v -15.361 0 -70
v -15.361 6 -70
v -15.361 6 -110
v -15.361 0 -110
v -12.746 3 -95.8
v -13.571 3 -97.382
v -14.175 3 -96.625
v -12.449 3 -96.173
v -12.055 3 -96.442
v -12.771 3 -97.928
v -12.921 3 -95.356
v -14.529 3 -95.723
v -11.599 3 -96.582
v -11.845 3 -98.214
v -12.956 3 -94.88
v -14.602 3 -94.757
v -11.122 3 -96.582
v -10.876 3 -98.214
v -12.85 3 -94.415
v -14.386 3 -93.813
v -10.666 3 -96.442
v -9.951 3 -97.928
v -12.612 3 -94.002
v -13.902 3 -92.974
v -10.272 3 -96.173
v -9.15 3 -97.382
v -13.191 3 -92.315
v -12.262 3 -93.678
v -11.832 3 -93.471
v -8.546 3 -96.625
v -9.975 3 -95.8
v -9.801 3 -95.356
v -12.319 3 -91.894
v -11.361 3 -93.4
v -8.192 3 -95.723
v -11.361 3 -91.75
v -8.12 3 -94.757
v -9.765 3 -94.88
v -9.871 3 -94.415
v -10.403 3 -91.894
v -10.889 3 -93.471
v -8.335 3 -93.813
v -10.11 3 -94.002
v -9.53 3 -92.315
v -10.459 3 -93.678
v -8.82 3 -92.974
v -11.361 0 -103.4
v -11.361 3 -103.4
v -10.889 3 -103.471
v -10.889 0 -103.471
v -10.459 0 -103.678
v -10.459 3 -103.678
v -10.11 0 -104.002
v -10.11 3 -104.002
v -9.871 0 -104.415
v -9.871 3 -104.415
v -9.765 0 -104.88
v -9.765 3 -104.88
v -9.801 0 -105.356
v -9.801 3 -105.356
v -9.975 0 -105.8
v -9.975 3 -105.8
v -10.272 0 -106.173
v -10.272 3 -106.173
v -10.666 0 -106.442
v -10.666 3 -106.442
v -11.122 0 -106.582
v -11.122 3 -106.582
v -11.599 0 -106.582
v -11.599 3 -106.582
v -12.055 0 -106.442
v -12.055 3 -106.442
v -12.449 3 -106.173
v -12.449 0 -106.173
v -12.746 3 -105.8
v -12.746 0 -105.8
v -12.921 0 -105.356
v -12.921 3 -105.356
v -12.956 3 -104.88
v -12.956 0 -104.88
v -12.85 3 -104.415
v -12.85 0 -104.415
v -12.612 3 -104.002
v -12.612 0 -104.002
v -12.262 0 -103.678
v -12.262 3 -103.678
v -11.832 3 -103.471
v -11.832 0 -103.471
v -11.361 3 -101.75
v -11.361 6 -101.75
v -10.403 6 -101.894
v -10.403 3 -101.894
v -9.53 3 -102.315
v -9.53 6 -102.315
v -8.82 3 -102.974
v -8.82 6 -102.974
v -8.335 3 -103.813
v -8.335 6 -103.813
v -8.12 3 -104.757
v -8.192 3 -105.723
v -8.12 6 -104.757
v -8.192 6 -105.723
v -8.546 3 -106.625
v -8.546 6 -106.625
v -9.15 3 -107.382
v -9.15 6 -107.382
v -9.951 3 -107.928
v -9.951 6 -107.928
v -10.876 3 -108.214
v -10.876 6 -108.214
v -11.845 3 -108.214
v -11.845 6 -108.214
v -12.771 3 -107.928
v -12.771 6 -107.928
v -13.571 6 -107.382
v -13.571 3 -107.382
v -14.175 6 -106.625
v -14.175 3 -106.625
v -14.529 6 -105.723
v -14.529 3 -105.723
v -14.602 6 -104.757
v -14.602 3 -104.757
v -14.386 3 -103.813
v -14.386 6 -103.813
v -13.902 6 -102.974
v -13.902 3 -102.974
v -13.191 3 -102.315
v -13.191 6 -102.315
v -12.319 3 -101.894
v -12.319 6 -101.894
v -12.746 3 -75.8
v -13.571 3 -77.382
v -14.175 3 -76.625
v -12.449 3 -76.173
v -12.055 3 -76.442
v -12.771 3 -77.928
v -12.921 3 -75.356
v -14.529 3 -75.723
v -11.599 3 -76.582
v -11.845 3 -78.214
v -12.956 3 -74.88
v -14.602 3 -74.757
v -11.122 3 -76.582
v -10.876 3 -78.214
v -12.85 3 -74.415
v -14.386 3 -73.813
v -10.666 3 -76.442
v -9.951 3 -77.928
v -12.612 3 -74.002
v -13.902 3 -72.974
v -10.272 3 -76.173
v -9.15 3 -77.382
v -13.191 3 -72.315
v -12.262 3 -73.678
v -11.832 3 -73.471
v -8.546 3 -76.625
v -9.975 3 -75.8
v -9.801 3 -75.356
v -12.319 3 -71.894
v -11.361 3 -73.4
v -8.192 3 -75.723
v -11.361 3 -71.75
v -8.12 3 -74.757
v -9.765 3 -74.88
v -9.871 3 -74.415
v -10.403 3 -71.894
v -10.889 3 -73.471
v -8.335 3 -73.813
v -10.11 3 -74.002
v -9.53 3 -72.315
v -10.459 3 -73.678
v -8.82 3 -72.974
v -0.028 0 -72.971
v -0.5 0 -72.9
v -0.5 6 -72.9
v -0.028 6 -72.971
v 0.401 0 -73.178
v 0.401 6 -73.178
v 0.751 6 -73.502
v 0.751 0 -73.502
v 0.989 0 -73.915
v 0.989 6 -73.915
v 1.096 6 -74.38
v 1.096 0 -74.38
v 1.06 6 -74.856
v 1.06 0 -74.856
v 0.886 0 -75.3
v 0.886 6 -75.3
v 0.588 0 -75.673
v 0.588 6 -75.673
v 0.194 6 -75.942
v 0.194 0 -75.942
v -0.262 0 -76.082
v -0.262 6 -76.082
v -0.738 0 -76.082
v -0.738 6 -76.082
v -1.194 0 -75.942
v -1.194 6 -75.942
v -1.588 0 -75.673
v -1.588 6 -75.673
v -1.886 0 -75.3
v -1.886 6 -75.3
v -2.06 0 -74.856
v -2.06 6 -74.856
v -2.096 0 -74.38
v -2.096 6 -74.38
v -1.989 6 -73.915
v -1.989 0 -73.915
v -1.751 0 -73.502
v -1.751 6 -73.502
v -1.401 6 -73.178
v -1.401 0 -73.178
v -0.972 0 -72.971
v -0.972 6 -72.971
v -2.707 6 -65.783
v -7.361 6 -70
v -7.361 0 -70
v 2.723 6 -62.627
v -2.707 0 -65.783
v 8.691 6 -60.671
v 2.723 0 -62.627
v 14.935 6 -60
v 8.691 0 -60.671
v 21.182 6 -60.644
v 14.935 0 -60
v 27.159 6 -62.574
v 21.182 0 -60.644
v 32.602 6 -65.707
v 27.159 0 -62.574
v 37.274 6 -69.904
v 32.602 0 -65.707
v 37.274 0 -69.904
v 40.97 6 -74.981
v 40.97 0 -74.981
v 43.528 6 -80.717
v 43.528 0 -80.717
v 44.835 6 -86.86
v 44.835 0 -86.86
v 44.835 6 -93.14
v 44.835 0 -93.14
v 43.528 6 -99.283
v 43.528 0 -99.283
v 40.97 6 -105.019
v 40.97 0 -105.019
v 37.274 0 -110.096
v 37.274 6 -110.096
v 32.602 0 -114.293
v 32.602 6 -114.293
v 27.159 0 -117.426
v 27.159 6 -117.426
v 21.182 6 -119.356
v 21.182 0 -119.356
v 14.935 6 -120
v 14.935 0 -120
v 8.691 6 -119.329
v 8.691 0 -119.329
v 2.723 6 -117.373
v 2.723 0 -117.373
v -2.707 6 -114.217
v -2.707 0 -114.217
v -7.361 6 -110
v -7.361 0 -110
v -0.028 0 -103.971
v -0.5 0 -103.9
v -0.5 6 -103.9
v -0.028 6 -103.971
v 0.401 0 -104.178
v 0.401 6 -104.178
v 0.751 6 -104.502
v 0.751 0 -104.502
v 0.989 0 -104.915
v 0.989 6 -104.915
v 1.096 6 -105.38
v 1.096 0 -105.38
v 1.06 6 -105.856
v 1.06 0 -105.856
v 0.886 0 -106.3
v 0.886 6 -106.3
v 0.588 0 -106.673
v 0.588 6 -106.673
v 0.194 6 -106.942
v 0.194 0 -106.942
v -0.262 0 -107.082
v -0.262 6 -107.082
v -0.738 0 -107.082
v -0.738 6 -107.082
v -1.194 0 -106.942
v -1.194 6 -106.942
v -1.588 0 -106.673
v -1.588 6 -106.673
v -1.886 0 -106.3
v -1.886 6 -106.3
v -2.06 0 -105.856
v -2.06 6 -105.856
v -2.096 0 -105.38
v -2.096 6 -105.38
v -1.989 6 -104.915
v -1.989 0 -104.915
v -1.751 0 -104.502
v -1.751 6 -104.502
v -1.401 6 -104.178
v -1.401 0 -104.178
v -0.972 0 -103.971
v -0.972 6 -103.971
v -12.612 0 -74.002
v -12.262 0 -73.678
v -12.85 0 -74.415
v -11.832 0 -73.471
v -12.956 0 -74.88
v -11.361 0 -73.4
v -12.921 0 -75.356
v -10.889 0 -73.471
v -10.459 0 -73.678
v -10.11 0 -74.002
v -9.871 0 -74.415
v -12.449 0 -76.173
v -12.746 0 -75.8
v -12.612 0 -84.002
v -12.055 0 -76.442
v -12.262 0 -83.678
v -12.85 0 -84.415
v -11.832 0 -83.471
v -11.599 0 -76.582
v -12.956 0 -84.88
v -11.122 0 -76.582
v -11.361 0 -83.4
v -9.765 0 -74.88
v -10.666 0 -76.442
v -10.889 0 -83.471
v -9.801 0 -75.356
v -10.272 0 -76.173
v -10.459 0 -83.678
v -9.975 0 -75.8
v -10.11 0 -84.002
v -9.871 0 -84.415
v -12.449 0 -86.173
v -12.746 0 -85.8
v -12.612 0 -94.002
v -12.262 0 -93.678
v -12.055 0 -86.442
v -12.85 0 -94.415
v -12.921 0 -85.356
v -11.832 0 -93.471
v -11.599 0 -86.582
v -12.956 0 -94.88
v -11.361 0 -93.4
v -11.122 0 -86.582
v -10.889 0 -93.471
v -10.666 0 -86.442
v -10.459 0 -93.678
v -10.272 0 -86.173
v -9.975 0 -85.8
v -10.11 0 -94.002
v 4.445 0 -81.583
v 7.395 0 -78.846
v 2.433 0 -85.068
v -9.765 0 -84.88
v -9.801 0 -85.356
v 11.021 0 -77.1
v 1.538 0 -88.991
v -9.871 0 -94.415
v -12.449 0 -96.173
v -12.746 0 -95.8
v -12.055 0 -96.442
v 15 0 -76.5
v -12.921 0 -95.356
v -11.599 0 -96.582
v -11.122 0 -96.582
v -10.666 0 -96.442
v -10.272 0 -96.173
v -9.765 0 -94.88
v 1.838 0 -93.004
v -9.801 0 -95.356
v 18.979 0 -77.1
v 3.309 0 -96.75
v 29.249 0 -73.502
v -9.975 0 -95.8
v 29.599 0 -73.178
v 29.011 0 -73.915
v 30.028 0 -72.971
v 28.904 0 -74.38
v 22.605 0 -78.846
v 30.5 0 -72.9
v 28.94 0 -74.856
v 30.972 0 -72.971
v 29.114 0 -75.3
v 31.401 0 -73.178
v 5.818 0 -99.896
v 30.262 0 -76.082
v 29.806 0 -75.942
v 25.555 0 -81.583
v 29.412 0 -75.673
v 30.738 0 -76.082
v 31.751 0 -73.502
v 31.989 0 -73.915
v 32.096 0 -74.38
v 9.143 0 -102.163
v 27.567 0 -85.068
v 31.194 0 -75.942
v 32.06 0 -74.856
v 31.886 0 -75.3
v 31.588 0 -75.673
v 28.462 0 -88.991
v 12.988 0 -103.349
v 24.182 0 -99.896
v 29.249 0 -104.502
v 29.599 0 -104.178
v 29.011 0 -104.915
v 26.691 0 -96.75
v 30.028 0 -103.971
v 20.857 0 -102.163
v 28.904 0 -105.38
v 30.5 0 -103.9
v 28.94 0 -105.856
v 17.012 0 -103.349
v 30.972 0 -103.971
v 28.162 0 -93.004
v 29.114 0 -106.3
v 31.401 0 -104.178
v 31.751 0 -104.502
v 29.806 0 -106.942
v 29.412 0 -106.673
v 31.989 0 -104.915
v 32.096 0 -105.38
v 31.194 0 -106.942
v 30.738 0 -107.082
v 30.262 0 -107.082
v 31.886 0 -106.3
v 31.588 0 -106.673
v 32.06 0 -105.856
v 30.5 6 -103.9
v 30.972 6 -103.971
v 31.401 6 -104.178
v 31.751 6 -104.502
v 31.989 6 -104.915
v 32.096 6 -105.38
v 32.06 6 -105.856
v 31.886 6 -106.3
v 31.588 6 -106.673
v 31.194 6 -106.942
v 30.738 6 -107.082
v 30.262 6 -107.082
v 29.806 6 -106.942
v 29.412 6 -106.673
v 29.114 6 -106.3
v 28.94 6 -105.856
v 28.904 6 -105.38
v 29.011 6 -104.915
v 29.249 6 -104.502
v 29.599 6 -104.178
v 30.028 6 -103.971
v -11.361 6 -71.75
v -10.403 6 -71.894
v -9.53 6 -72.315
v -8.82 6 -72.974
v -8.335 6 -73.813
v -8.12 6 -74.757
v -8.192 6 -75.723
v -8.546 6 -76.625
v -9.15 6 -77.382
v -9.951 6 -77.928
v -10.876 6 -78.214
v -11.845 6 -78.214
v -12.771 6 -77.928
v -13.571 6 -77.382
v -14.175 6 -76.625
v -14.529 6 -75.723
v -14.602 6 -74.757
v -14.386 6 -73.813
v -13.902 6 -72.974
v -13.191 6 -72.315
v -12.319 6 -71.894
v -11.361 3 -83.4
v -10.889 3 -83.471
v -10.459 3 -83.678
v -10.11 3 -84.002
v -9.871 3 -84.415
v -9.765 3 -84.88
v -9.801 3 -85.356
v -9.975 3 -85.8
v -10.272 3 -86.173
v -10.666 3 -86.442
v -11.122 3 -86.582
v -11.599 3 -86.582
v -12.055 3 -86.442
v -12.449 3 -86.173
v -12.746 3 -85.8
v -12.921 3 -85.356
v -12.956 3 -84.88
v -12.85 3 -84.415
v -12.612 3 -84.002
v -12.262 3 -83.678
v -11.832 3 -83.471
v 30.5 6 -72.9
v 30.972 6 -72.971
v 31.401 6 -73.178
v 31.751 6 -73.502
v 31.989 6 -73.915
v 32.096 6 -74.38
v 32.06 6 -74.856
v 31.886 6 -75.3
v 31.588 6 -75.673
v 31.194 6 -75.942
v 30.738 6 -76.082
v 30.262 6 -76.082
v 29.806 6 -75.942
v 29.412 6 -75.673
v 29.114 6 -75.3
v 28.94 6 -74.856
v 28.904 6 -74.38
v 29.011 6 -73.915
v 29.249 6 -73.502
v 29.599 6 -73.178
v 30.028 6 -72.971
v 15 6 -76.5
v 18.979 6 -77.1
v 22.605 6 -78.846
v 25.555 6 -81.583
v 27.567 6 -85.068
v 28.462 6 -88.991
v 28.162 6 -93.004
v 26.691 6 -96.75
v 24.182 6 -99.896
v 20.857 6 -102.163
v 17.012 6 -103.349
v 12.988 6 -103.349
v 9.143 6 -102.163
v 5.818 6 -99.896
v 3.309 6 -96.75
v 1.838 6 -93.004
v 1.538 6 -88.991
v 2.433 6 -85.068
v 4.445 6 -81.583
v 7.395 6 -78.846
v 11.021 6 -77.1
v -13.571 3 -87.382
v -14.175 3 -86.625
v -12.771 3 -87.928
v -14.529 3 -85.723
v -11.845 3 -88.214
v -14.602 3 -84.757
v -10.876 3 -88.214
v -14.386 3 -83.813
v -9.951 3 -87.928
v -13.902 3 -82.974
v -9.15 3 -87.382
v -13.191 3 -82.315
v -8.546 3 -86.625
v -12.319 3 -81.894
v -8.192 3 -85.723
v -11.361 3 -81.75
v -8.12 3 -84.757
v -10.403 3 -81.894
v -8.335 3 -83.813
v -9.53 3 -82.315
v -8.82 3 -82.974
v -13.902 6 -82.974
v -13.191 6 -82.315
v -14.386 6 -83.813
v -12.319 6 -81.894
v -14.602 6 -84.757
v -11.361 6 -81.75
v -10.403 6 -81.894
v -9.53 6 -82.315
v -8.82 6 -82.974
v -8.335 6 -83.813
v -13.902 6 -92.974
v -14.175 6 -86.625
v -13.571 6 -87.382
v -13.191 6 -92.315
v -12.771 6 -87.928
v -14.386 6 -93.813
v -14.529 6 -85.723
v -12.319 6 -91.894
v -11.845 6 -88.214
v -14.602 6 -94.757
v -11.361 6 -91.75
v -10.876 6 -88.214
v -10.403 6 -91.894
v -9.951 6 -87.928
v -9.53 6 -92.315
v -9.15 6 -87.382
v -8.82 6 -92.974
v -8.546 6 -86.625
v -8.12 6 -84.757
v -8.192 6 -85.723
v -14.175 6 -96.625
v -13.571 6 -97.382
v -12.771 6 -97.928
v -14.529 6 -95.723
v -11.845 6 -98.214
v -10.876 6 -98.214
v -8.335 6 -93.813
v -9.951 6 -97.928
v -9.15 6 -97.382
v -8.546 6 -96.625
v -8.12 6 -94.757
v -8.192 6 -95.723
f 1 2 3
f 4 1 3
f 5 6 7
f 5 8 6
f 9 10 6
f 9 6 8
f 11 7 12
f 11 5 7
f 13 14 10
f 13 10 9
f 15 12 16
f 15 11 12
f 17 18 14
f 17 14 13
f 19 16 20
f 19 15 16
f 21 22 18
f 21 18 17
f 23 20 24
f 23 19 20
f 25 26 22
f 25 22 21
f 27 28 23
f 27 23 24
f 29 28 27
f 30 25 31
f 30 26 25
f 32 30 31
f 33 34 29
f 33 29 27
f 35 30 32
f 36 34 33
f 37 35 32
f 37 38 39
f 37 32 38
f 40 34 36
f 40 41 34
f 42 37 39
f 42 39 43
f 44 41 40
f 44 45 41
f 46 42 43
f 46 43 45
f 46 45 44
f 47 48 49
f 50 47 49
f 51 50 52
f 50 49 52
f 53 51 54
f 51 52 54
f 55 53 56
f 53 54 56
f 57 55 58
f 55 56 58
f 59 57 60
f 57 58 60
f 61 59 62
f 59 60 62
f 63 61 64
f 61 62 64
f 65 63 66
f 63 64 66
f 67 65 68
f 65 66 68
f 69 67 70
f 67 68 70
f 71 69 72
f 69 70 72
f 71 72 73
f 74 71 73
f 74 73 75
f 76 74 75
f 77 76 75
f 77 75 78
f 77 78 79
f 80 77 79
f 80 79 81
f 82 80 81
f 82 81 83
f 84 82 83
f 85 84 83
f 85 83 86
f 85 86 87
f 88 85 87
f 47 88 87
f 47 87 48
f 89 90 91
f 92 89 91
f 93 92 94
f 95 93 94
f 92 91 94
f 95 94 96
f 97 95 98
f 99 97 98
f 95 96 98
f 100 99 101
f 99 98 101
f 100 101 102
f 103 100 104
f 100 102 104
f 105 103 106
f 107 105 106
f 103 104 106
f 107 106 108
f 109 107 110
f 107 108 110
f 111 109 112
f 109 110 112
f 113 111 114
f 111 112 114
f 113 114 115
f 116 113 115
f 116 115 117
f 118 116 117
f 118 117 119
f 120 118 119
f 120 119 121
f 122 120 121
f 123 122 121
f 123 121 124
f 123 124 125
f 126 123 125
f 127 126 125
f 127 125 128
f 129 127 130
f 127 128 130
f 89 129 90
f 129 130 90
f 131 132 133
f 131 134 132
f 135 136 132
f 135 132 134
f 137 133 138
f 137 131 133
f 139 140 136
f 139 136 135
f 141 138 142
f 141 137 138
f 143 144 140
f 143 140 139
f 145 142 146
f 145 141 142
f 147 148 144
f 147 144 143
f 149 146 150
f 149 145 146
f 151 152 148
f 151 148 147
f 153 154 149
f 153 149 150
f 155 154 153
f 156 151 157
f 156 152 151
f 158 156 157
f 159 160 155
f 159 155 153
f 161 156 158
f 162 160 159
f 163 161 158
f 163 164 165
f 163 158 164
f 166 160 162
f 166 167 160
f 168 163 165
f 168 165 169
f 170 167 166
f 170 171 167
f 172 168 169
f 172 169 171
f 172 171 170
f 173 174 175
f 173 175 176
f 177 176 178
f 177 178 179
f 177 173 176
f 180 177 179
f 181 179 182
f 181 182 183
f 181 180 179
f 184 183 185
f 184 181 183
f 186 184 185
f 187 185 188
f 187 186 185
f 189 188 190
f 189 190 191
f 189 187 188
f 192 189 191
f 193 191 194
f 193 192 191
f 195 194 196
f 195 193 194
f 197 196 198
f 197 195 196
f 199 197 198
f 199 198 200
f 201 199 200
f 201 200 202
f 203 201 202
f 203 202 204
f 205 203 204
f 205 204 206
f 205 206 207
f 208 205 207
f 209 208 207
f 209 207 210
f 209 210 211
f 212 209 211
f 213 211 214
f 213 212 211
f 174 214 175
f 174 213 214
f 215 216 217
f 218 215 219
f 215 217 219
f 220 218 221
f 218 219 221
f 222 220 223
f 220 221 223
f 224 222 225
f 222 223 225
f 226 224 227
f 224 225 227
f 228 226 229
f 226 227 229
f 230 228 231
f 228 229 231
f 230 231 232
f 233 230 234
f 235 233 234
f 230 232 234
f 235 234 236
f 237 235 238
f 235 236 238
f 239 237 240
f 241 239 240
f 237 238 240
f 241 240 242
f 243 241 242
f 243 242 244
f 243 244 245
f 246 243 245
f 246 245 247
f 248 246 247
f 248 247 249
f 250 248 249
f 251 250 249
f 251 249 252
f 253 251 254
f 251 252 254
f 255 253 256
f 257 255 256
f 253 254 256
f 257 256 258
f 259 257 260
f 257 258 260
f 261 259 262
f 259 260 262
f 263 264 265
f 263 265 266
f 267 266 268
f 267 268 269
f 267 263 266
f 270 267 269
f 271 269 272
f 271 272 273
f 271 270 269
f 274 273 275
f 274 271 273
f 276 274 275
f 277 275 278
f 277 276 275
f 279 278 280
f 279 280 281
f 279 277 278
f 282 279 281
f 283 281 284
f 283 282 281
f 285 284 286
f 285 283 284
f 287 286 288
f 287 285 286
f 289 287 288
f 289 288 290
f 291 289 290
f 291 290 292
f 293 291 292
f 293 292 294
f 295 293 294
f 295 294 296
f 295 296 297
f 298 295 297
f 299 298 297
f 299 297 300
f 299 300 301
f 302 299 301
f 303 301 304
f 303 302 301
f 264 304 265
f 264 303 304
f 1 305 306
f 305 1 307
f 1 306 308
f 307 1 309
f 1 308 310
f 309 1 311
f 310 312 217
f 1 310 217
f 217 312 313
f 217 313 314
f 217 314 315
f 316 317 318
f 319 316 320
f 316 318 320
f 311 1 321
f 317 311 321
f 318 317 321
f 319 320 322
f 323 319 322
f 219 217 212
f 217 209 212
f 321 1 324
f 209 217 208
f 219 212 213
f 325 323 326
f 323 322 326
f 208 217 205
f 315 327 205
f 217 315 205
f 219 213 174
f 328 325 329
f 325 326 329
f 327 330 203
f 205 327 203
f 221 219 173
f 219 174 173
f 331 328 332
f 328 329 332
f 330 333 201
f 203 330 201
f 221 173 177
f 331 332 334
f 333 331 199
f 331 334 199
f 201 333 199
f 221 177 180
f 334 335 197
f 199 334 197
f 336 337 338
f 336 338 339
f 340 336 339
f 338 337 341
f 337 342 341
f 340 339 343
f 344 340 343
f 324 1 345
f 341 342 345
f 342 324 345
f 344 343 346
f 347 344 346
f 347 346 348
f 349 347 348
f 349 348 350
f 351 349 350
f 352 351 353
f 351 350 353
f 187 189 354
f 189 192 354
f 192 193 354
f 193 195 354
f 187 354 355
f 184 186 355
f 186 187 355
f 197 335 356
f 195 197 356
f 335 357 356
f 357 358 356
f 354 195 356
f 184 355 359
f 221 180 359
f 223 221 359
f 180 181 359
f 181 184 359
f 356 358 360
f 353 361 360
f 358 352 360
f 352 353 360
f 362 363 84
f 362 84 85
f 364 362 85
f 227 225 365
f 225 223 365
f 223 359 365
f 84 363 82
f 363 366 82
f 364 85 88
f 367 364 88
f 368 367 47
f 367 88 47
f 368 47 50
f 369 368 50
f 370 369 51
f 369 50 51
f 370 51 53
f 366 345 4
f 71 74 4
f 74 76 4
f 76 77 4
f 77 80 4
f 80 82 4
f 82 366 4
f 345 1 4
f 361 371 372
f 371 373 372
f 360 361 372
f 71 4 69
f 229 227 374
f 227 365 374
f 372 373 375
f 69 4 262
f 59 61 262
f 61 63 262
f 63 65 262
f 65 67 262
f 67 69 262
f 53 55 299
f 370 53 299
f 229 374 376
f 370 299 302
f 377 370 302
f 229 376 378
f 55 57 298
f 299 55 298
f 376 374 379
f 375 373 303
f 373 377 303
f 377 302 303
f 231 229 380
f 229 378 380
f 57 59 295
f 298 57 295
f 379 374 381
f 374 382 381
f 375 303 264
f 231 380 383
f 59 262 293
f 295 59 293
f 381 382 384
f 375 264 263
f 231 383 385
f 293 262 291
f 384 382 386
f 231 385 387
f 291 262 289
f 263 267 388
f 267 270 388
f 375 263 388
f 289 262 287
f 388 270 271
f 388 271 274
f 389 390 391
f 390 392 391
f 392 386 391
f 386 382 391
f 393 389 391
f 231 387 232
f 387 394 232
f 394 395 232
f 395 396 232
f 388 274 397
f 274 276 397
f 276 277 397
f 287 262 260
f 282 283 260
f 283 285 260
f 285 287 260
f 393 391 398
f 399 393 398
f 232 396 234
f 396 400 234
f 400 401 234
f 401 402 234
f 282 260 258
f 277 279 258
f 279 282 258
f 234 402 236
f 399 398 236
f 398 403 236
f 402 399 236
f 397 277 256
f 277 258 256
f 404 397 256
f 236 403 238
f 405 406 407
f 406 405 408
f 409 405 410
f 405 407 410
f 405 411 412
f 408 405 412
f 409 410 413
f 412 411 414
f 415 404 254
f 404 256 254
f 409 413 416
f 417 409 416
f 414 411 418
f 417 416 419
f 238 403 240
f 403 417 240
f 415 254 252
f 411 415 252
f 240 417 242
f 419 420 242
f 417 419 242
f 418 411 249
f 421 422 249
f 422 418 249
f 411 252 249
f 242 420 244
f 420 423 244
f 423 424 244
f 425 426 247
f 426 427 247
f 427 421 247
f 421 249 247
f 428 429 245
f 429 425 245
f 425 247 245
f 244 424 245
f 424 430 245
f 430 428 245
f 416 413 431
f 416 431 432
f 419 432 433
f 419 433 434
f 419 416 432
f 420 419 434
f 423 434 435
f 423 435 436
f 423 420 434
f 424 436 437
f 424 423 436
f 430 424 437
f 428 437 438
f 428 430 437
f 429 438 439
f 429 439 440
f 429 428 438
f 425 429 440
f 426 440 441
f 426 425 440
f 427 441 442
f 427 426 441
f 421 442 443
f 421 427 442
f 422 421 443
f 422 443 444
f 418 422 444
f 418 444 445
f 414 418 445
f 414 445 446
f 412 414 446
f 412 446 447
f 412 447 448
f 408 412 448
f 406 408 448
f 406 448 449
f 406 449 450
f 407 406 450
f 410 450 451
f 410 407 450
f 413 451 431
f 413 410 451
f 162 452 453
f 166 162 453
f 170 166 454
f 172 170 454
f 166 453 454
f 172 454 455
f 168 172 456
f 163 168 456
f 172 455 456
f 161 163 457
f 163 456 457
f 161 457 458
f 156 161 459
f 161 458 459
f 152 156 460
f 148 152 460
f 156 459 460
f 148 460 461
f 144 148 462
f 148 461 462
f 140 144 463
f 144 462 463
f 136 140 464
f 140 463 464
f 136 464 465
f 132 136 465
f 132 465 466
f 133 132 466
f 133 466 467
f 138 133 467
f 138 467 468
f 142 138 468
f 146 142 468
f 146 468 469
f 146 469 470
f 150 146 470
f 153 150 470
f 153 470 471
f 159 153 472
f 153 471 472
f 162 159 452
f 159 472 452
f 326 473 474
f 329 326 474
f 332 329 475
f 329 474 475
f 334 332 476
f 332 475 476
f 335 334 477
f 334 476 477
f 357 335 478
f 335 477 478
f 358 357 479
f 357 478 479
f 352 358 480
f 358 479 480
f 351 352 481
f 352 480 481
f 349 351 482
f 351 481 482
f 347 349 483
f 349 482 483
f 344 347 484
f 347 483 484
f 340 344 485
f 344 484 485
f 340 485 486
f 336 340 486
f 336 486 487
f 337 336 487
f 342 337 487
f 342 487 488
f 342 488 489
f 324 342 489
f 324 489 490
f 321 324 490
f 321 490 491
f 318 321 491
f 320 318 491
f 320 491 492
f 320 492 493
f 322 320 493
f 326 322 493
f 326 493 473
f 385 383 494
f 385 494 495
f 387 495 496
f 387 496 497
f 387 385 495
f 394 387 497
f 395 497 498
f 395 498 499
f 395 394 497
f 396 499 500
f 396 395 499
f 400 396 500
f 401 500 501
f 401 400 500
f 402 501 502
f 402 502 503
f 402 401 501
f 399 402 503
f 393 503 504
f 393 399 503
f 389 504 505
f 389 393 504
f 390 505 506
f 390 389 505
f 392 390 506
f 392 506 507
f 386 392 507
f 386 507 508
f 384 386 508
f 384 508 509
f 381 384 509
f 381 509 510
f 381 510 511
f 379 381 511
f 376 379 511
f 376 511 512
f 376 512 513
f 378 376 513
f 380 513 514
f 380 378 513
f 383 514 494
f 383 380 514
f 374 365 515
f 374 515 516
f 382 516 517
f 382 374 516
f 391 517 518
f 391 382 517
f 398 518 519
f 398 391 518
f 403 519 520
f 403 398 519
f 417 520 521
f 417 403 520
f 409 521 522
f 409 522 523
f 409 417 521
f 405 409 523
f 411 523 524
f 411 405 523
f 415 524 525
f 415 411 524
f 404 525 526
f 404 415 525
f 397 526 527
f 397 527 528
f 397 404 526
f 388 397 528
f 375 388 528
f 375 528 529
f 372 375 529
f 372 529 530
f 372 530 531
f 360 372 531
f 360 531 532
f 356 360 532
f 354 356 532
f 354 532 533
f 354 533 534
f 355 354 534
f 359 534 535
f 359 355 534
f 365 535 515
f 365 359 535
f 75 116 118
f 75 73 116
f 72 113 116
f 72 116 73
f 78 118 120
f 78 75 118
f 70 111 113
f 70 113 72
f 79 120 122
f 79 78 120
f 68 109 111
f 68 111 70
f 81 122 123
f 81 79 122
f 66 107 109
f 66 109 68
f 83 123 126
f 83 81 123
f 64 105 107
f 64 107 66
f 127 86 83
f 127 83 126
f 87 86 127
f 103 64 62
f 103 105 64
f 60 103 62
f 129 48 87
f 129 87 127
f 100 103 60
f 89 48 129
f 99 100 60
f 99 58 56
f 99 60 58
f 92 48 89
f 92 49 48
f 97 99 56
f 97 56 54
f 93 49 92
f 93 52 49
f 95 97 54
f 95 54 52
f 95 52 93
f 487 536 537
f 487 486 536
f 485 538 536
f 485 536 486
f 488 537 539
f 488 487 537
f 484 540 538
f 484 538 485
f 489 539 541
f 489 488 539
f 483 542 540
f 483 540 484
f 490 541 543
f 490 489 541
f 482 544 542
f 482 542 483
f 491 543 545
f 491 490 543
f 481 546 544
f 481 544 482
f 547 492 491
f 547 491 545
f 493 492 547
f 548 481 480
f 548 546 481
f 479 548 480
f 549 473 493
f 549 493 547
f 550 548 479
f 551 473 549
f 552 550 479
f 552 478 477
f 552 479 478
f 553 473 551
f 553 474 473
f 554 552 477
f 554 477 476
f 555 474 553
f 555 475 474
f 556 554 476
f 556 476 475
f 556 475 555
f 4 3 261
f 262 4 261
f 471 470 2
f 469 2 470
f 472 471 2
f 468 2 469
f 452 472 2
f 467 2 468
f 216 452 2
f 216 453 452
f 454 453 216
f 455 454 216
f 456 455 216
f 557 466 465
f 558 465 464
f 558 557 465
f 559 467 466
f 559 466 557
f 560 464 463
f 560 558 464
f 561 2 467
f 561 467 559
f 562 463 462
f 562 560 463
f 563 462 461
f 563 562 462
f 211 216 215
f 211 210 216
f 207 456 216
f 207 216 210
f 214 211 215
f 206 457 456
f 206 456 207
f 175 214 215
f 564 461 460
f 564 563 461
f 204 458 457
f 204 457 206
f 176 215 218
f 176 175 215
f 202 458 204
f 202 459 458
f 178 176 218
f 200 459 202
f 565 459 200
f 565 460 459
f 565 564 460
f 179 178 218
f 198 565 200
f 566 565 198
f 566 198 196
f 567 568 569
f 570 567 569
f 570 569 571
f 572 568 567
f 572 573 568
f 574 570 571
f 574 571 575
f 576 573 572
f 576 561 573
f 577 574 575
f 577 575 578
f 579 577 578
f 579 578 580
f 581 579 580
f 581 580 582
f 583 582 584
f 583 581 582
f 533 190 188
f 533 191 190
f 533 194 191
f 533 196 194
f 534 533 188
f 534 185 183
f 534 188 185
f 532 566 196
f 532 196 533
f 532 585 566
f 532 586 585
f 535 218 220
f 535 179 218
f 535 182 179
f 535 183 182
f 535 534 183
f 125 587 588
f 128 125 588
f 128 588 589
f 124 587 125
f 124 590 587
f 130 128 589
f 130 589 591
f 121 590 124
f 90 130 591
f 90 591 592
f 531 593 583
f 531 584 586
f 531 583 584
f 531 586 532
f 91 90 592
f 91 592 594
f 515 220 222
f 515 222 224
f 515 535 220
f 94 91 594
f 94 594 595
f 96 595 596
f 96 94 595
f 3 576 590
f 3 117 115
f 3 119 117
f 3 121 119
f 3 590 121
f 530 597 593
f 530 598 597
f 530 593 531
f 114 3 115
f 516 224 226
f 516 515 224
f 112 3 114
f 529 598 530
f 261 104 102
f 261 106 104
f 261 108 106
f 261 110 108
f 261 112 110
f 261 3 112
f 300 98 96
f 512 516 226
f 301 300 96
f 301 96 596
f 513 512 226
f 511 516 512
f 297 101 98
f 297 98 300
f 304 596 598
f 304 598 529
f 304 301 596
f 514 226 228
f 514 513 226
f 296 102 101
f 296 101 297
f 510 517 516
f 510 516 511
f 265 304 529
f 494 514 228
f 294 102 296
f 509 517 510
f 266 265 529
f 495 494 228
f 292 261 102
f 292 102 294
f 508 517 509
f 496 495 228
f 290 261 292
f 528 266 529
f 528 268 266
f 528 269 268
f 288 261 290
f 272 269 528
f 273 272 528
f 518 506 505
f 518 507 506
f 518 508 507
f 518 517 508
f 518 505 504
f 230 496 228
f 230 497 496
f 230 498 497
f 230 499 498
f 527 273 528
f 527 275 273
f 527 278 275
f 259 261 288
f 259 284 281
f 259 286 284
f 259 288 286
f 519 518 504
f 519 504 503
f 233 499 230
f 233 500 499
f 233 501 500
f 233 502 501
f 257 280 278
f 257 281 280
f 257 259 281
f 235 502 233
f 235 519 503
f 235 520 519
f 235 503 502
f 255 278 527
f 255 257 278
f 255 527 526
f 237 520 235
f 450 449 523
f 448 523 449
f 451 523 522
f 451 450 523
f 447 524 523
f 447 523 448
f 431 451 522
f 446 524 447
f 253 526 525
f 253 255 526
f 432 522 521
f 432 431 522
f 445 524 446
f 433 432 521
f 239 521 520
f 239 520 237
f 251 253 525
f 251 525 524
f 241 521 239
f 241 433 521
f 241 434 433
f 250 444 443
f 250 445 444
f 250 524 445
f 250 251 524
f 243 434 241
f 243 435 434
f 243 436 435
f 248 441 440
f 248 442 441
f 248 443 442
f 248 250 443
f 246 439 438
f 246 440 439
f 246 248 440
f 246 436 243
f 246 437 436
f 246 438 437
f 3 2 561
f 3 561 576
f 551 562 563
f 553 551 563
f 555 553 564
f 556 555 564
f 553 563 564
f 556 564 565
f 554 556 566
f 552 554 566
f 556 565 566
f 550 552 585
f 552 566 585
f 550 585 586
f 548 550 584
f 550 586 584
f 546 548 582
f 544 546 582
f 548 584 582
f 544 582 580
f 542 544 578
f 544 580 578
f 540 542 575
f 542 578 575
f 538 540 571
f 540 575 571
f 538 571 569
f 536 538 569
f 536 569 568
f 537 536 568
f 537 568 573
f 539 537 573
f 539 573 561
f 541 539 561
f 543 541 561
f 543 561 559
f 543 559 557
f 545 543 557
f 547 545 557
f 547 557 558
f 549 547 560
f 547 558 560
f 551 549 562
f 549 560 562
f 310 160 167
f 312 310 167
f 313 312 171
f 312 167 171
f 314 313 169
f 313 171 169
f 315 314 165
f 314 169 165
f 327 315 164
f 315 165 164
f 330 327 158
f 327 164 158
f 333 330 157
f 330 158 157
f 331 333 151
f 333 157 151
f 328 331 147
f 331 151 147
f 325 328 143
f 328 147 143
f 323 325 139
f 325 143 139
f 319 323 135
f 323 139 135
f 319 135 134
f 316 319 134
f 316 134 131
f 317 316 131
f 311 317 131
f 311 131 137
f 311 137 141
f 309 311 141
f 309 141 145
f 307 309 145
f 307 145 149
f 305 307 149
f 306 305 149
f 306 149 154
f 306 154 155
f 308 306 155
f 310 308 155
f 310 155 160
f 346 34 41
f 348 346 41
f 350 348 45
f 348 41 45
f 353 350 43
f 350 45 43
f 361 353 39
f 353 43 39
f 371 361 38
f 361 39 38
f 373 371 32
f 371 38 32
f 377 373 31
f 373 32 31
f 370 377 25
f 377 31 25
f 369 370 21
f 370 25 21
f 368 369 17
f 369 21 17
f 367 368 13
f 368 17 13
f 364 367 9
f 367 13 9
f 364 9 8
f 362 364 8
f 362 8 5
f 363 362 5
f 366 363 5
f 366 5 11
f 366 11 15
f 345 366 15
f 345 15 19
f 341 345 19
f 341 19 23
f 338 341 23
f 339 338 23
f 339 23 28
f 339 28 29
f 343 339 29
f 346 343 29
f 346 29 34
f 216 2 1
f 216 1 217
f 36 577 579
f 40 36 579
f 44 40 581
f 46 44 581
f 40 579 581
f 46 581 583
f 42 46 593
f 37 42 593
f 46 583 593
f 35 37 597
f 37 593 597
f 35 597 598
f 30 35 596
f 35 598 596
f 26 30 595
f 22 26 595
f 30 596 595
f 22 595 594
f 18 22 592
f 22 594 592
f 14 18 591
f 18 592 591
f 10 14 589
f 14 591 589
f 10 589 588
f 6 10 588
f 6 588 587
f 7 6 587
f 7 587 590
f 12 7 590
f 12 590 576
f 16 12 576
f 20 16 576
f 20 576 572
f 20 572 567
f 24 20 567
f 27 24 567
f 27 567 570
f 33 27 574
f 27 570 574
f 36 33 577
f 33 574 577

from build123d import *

# Parameters (mm, degrees)
SKETCH_1_R          = 30
SKETCH_1_R_2        = 1.6
SKETCH_1_R_3        = 13.5
EXTRUDE_1_DEPTH     = 6
SKETCH_2_W          = 8
SKETCH_2_H          = 40
EXTRUDE_2_DEPTH     = 6
SKETCH_3_R          = 1.6
CUT_EXTRUDE_1_DEPTH = 6
SKETCH_4_R          = 3.25
CUT_EXTRUDE_2_DEPTH = 3


with BuildPart() as part:
    # 草图1 → 凸台-拉伸1 (new body)
    with BuildSketch(Plane(origin=(0, 0, 0), x_dir=(1, 0, 0), z_dir=(0, 1, 0))):
        with Locations(Location((15, 90, 0), (0, 0, 270))):
            Circle(SKETCH_1_R)
        with Locations(Location((30.5, 105.5, 0), (0, 0, 270))):
            Circle(SKETCH_1_R_2, mode=Mode.SUBTRACT)
        with Locations(Location((-0.5, 105.5, 0), (0, 0, 270))):
            Circle(SKETCH_1_R_2, mode=Mode.SUBTRACT)
        with Locations(Location((15, 90, 0), (0, 0, 270))):
            Circle(SKETCH_1_R_3, mode=Mode.SUBTRACT)
        with Locations(Location((30.5, 74.5, 0), (0, 0, 270))):
            Circle(SKETCH_1_R_2, mode=Mode.SUBTRACT)
        with Locations(Location((-0.5, 74.5, 0), (0, 0, 270))):
            Circle(SKETCH_1_R_2, mode=Mode.SUBTRACT)
    extrude(amount=EXTRUDE_1_DEPTH)

    # 草图2 → 凸台-拉伸2 (add)
    with BuildSketch(Plane(origin=(0, 6, 0), x_dir=(1, 0, 0), z_dir=(0, 1, 0))):
        with Locations((-11.360679775, 90)):
            Rectangle(SKETCH_2_W, SKETCH_2_H)
    extrude(amount=-EXTRUDE_2_DEPTH)

    # 草图3 → 切除-拉伸1 (cut)
    with BuildSketch(Plane(origin=(0, 6, 0), x_dir=(1, 0, 0), z_dir=(0, 1, 0))):
        with Locations(Location((-11.360679775, 105, 0), (0, 0, 270))):
            Circle(SKETCH_3_R)
        with Locations(Location((-11.360679775, 95, 0), (0, 0, 270))):
            Circle(SKETCH_3_R)
        with Locations(Location((-11.360679775, 85, 0), (0, 0, 270))):
            Circle(SKETCH_3_R)
        with Locations(Location((-11.360679775, 75, 0), (0, 0, 270))):
            Circle(SKETCH_3_R)
    extrude(amount=-CUT_EXTRUDE_1_DEPTH, mode=Mode.SUBTRACT)

    # 草图4 → 切除-拉伸2 (cut)
    with BuildSketch(Plane(origin=(0, 6, 0), x_dir=(1, 0, 0), z_dir=(0, 1, 0))):
        with Locations(Location((-11.360679775, 105, 0), (0, 0, 270))):
            Circle(SKETCH_4_R)
        with Locations(Location((-11.360679775, 95, 0), (0, 0, 270))):
            Circle(SKETCH_4_R)
        with Locations(Location((-11.360679775, 85, 0), (0, 0, 270))):
            Circle(SKETCH_4_R)
        with Locations(Location((-11.360679775, 75, 0), (0, 0, 270))):
            Circle(SKETCH_4_R)
    extrude(amount=-CUT_EXTRUDE_2_DEPTH, mode=Mode.SUBTRACT)


solid = part.part
